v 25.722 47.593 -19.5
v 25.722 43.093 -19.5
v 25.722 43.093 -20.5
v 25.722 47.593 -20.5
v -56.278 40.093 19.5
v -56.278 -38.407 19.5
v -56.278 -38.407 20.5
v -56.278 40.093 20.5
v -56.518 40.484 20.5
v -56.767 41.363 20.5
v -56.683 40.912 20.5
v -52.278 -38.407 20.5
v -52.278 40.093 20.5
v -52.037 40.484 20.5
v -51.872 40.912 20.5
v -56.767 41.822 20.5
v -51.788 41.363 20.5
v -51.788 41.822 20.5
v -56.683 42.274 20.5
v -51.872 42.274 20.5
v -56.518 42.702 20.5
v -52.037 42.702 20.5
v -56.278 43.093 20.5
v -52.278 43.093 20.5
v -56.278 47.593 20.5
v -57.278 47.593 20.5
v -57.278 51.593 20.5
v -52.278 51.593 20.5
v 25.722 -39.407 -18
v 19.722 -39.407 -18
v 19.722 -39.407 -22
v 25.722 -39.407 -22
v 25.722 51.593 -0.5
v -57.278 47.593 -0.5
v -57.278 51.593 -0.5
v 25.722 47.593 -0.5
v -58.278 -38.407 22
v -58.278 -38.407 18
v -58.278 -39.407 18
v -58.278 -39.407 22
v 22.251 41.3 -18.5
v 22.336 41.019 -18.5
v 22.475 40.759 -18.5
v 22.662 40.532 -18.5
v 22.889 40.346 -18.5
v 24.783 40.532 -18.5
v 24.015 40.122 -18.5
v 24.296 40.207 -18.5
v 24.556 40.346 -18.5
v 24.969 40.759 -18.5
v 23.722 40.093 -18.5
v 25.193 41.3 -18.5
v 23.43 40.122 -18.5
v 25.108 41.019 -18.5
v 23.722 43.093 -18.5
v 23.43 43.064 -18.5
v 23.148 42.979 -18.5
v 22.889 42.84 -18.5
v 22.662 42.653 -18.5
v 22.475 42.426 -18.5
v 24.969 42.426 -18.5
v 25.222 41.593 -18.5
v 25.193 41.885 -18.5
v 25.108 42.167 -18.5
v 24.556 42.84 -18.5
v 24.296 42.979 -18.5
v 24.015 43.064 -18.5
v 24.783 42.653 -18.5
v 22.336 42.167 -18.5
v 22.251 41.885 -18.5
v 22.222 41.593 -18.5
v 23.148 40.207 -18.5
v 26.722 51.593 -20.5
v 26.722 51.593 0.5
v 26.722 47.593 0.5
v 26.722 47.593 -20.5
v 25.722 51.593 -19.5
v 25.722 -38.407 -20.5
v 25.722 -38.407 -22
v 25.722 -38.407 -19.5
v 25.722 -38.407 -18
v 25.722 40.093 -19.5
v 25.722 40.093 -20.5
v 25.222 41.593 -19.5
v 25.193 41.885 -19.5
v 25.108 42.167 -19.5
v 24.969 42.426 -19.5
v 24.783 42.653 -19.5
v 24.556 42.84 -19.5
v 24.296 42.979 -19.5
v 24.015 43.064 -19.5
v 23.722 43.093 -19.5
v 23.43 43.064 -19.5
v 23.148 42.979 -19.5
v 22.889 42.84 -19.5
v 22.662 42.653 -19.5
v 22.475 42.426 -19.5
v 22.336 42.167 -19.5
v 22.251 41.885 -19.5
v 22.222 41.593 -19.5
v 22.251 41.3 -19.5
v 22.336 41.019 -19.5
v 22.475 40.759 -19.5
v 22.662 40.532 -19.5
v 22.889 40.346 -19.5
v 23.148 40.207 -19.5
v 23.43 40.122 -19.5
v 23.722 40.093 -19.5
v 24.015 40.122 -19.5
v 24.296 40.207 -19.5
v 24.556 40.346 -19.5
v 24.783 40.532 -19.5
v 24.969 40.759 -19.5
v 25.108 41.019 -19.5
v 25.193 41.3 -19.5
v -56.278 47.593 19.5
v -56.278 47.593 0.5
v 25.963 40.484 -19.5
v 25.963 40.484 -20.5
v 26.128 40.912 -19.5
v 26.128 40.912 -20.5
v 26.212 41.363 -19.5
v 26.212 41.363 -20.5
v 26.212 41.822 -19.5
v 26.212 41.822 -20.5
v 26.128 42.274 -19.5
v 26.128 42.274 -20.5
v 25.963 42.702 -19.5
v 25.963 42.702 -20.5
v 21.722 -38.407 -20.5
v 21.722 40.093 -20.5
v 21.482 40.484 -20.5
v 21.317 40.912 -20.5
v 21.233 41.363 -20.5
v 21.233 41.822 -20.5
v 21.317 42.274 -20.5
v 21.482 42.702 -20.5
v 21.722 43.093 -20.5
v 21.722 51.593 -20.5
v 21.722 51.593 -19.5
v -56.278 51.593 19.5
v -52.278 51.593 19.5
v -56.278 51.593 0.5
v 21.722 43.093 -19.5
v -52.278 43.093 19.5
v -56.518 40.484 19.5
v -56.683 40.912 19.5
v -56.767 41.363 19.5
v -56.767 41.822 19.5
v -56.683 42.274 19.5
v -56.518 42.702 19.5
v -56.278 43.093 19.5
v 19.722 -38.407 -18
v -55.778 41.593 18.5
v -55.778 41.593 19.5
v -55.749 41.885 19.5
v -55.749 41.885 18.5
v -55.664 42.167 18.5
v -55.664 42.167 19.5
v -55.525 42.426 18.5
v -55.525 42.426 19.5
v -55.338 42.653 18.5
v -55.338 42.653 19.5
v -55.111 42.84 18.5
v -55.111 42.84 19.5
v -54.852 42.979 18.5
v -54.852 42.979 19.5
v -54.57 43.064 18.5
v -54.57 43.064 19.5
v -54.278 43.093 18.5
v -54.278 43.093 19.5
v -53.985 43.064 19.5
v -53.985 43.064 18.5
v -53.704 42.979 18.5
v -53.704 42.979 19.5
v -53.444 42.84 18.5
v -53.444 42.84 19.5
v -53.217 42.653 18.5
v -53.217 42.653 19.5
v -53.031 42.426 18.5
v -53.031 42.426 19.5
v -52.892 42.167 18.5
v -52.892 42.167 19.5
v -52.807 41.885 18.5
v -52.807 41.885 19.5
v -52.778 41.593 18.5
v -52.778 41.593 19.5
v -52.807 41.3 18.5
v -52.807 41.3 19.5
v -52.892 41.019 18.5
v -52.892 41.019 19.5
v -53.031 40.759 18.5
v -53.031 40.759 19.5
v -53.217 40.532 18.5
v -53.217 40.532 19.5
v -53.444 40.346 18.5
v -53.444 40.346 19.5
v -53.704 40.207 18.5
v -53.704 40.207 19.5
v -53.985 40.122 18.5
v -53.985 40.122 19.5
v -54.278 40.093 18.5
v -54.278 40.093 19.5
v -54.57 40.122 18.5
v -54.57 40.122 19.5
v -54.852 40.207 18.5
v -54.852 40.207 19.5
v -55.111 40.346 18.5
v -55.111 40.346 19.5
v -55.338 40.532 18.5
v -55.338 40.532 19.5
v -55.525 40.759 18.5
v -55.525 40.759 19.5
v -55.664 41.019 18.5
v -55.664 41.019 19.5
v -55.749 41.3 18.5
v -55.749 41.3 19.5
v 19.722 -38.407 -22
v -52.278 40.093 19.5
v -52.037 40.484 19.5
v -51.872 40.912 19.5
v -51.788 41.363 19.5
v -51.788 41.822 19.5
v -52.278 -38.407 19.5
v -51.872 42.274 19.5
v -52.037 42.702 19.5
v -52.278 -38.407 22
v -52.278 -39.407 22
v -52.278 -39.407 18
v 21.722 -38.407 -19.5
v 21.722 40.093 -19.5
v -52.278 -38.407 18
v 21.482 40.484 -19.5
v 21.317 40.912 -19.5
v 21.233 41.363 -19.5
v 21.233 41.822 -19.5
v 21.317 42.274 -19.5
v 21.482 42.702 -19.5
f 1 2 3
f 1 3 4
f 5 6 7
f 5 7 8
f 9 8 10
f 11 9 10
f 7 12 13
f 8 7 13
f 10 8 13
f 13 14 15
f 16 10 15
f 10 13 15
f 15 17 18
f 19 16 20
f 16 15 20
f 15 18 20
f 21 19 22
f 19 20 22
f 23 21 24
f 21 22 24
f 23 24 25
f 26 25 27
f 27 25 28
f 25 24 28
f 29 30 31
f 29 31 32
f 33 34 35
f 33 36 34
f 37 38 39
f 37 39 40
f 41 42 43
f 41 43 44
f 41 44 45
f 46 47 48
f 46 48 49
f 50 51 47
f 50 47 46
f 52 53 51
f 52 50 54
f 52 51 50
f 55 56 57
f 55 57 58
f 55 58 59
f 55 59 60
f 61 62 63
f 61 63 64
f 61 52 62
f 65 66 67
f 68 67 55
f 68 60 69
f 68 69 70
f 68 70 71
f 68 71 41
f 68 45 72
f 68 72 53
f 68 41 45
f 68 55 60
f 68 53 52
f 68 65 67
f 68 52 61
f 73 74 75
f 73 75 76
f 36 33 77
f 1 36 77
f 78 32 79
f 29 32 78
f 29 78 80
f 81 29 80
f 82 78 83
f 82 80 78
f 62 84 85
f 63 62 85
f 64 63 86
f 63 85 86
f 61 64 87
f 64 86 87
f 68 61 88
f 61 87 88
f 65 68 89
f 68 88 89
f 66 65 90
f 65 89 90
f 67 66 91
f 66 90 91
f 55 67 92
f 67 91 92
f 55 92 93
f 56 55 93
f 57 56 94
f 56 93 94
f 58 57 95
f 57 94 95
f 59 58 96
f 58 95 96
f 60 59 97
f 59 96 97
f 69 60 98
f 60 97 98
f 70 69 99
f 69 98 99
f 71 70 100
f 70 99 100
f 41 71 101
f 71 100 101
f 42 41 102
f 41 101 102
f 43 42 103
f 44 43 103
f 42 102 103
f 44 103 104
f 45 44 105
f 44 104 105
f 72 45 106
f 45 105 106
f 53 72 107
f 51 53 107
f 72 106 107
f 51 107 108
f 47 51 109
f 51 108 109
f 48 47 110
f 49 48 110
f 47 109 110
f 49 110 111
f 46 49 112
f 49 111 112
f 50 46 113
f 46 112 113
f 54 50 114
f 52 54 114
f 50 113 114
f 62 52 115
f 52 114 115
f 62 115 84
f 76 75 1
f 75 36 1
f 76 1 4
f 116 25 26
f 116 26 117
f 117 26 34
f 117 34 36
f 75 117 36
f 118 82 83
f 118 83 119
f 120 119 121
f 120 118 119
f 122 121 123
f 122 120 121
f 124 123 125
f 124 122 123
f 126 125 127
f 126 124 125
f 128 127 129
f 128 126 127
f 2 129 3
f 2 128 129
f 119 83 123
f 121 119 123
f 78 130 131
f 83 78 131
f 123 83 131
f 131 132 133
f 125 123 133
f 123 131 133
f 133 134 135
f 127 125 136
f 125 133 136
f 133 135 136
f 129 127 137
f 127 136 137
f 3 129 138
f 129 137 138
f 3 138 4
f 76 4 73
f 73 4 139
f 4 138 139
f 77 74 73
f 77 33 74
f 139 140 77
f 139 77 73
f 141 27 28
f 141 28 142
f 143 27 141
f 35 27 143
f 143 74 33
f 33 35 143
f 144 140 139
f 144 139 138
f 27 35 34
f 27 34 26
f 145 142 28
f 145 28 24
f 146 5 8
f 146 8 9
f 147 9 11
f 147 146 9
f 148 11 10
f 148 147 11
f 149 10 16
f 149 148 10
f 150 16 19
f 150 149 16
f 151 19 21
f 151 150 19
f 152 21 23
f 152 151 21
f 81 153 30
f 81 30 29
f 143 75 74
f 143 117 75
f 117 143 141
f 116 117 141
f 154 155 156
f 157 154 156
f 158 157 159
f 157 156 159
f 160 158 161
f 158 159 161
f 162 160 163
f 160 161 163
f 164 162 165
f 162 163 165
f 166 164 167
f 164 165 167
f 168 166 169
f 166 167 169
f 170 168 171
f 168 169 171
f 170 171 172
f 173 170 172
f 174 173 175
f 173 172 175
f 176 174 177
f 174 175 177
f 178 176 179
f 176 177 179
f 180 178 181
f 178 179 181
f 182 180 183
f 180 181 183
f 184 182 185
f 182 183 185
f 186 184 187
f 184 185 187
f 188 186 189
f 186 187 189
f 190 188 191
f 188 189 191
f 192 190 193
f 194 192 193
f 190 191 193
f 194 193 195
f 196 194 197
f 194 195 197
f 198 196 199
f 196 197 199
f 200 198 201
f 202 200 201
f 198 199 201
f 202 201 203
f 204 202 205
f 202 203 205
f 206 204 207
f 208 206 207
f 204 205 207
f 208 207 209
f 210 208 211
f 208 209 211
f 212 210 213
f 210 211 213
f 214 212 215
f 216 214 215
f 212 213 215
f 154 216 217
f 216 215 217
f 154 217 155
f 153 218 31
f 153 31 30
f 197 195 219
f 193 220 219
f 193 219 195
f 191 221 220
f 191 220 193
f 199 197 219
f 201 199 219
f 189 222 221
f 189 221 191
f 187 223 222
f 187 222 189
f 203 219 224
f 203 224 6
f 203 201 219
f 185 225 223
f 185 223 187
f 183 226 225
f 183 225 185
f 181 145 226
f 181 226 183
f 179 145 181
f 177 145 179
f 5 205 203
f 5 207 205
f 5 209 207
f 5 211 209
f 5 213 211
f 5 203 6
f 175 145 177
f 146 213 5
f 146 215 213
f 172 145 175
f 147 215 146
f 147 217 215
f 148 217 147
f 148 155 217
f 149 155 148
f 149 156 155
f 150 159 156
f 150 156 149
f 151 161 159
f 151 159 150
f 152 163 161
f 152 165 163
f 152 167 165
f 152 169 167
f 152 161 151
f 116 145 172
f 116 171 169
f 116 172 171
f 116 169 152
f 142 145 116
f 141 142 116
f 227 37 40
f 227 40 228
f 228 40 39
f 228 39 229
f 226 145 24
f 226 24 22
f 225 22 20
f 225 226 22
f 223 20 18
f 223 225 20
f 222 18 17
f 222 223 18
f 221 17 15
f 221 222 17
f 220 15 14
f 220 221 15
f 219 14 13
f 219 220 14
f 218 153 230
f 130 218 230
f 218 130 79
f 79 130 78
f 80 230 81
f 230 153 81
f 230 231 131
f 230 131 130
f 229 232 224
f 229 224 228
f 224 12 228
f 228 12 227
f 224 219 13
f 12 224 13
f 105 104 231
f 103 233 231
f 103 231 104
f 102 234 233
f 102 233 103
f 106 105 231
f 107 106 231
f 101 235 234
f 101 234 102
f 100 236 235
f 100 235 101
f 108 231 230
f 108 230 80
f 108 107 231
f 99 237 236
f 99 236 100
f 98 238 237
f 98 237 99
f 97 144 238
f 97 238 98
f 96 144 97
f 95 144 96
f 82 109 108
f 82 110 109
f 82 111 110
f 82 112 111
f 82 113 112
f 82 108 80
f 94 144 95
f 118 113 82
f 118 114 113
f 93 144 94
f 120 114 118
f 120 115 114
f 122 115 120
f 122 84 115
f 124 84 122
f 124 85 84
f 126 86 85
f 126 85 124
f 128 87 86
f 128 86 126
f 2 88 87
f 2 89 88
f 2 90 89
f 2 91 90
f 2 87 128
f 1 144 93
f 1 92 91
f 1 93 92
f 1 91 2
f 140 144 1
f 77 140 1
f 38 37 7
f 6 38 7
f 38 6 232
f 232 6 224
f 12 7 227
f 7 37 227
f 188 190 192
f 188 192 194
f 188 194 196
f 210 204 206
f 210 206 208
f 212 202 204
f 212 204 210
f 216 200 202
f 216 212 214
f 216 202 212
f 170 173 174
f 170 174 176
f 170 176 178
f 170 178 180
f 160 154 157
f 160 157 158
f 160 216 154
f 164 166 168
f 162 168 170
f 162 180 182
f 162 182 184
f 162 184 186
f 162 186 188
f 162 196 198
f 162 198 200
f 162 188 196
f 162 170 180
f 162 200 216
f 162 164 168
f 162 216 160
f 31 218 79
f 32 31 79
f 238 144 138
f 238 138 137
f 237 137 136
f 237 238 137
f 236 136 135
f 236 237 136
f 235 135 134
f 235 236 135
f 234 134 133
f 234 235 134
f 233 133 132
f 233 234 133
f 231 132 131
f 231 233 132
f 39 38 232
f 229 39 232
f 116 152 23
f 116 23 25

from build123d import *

# Parameters (mm, degrees)
EXTRUDE_1_DEPTH = 1
SKETCH_2_R      = 1.5
EXTRUDE_2_DEPTH = 1
EXTRUDE_3_DEPTH = 1
SKETCH_4_R      = 1.5
EXTRUDE_5_DEPTH = 1
SKETCH_5_W      = 82
SKETCH_5_H      = 4
EXTRUDE_6_DEPTH = 0.5
SKETCH_6_W      = 21
SKETCH_6_H      = 4
EXTRUDE_7_DEPTH = 1
SKETCH_7_W      = 21
SKETCH_7_H      = 4
EXTRUDE_8_DEPTH = 1
SKETCH_8_W      = 6
SKETCH_8_H      = 4
EXTRUDE_9_DEPTH = 1


with BuildPart() as part:
    # 草图1 → 凸台-拉伸1 (new body)
    with BuildSketch(Plane(origin=(0, 0, -19.5), x_dir=(-1, 0, 0), z_dir=(0, 0, -1))):
        with BuildLine():
            Line((-21.722283328, 40.092812976), (-21.722283328, -38.407187024))
            Line((-21.722283328, -38.407187024), (-25.722283328, -38.407187024))
            Line((-25.722283328, -38.407187024), (-25.722283328, 40.092812976))
            ThreePointArc((-25.722283328, 40.092812976), (-26.222283328, 41.592812976), (-25.722283328, 43.092812976))
            Line((-25.722283328, 43.092812976), (-25.722283328, 51.592812976))
            Line((-25.722283328, 51.592812976), (-21.722283328, 51.592812976))
            Line((-21.722283328, 51.592812976), (-21.722283328, 43.092812976))
            ThreePointArc((-21.722283328, 43.092812976), (-21.222283328, 41.592812976), (-21.722283328, 40.092812976))
        make_face()
    extrude(amount=EXTRUDE_1_DEPTH)

    # 草图2 → 凸台-拉伸2 (add)
    with BuildSketch(Plane.XY.offset(-19.5)):
        with Locations((23.722283328, 41.592812976)):
            Circle(SKETCH_2_R)
    extrude(amount=EXTRUDE_2_DEPTH)



with BuildPart() as body_2:
    # 草图3 → 凸台-拉伸3 (new body)
    with BuildSketch(Plane.XY.offset(19.5)):
        with BuildLine():
            Line((-52.277716672, 40.092812976), (-52.277716672, -38.407187024))
            Line((-52.277716672, -38.407187024), (-56.277716672, -38.407187024))
            Line((-56.277716672, -38.407187024), (-56.277716672, 40.092812976))
            ThreePointArc((-56.277716672, 40.092812976), (-56.777716672, 41.592812976), (-56.277716672, 43.092812976))
            Line((-56.277716672, 43.092812976), (-56.277716672, 51.592812976))
            Line((-56.277716672, 51.592812976), (-52.277716672, 51.592812976))
            Line((-52.277716672, 51.592812976), (-52.277716672, 43.092812976))
            ThreePointArc((-52.277716672, 43.092812976), (-51.777716672, 41.592812976), (-52.277716672, 40.092812976))
        make_face()
    extrude(amount=EXTRUDE_3_DEPTH)

    # 草图4 → 凸台-拉伸5 (add)
    with BuildSketch(Plane(origin=(0, 0, 19.5), x_dir=(-1, 0, 0), z_dir=(0, 0, -1))):
        with Locations((54.277716672, 41.592812976)):
            Circle(SKETCH_4_R)
    extrude(amount=EXTRUDE_5_DEPTH)



with BuildPart() as body_3:
    # 草图5 → 凸台-拉伸6 (new body, symmetric)
    with BuildSketch(Plane.XY):
        with Locations((-15.277716672, 49.592812976)):
            Rectangle(SKETCH_5_W, SKETCH_5_H)
    extrude(amount=EXTRUDE_6_DEPTH, both=True)


with BuildPart() as body_2_1:
    add(body_2.part)

    add(body_3.part)  # 凸台-拉伸7 merges body 3
    # 草图6 → 凸台-拉伸7 (add)
    with BuildSketch(Plane.ZY.offset(56.277716672)):
        with Locations((10, 49.592812976)):
            Rectangle(SKETCH_6_W, SKETCH_6_H)
    extrude(amount=EXTRUDE_7_DEPTH)


with BuildPart() as part_1:
    add(part.part)

    add(body_2_1.part)  # 凸台-拉伸8 merges body 2
    # 草图7 → 凸台-拉伸8 (add)
    with BuildSketch(Plane(origin=(25.722283328, 0, 0), x_dir=(0, 0, -1), z_dir=(1, 0, 0))):
        with Locations((10, 49.592812976)):
            Rectangle(SKETCH_7_W, SKETCH_7_H)
    extrude(amount=EXTRUDE_8_DEPTH)

    # 草图8 → 凸台-拉伸9 (add)
    with BuildSketch(Plane.XZ.offset(38.407187024)):
        with Locations((-55.277716672, 20)):
            Rectangle(SKETCH_8_W, SKETCH_8_H)
        with Locations((22.722283328, -20)):
            Rectangle(SKETCH_8_W, SKETCH_8_H)
    extrude(amount=EXTRUDE_9_DEPTH)


solid = part_1.part
